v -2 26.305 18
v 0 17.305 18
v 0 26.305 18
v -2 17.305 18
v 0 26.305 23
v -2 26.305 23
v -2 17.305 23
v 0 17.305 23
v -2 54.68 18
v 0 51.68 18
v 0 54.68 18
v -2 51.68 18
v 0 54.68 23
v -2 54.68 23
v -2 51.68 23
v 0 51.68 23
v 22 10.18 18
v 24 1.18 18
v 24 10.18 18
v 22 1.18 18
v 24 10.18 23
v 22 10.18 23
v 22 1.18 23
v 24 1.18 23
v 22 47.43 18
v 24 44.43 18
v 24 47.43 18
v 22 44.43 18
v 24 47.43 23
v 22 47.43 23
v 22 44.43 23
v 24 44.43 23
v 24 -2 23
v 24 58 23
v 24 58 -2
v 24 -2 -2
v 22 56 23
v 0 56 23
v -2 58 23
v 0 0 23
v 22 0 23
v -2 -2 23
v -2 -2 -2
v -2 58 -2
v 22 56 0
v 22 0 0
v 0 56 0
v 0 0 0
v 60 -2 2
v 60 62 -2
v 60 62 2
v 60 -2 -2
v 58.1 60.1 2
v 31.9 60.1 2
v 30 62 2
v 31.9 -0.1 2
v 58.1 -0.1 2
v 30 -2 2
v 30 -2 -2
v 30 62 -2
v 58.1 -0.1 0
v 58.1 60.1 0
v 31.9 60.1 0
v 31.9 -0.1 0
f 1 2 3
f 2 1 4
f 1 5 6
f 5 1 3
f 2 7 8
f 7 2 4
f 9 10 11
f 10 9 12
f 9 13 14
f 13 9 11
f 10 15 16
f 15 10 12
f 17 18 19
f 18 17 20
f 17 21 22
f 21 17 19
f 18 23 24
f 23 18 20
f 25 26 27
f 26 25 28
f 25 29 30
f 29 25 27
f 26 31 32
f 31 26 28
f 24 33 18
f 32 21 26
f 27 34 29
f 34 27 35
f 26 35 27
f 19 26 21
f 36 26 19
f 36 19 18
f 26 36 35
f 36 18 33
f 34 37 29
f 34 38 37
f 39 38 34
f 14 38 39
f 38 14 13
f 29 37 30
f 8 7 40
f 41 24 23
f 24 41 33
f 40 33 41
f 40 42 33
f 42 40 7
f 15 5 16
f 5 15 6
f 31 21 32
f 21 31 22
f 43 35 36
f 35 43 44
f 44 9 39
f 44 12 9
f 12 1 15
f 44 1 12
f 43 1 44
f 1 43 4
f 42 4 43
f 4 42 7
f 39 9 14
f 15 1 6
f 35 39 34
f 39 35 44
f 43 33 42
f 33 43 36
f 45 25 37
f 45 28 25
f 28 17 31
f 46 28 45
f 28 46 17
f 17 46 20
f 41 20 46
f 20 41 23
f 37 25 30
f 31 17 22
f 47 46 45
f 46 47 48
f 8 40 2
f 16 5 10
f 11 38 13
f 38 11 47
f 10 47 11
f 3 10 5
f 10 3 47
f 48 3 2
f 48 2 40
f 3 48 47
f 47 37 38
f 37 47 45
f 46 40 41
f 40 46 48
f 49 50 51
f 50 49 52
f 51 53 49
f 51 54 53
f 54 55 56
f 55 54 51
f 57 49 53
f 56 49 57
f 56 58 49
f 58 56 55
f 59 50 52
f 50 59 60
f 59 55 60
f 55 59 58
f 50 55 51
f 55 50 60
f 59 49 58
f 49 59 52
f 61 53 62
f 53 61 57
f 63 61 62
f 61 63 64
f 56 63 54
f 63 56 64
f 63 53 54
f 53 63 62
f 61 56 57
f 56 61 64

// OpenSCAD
relayBoardWidth=22;
relayBoardHeight=56;
wallThickness=2;

portSize=6;
relayOut=[2.65, 37.195];
relayIn=[2.65, 2.82];
neut=[14.95, 53.32];

coilHigh=[18.98, 1.6];
coilLow=[18.98, 18.54];

cableM = 3;

function pcbToCaseX(pcb) = pcb;
function pcbToCaseY(pcb) = relayBoardHeight - pcb;

containerHeight=23;

difference() {
    translate([-wallThickness, -wallThickness, -wallThickness]) {
        cube([2 * wallThickness + relayBoardWidth, 2 * wallThickness + relayBoardHeight, wallThickness + containerHeight]);
    }
    cube([relayBoardWidth, relayBoardHeight, containerHeight + 0.01]);

    translate([-wallThickness - 0.01,0, containerHeight - cableM - wallThickness]) {
        translate([0, pcbToCaseY(relayOut[1]) - cableM / 2, 0]) {
            cube([wallThickness + 0.02, cableM * 3, cableM + wallThickness + 0.01]);
        }

        translate([0, pcbToCaseY(relayIn[1]) - cableM / 2, 0]) {
            cube([wallThickness + 0.02, cableM, cableM + wallThickness + 0.01]);
        }
    }

    translate([relayBoardWidth - 0.01,0, containerHeight - cableM - wallThickness]) {
        translate([0, pcbToCaseY(neut[1]) - cableM / 2, 0]) {
            cube([wallThickness + 0.02, cableM * 3, cableM + wallThickness + 0.01]);
        }
        translate([0, (pcbToCaseY(coilHigh[1]) + pcbToCaseY(coilLow[1])) / 2 - cableM / 2, 0]) {
            cube([wallThickness + 0.02, cableM, cableM + wallThickness + 0.01]);
        }
    }
}

translate([relayBoardWidth + 10, 0, 0]) {
    difference() {
        translate([-wallThickness, -wallThickness, -wallThickness]) {
            cube([4 * wallThickness + relayBoardWidth, 4 * wallThickness + relayBoardHeight, 2 * wallThickness]);
        }
        translate([-0.1, -0.1,0]) {
            cube([2 * wallThickness + relayBoardWidth + 0.2, 2 * wallThickness + relayBoardHeight + 0.2, wallThickness + 0.01]);
        }
    }
}
